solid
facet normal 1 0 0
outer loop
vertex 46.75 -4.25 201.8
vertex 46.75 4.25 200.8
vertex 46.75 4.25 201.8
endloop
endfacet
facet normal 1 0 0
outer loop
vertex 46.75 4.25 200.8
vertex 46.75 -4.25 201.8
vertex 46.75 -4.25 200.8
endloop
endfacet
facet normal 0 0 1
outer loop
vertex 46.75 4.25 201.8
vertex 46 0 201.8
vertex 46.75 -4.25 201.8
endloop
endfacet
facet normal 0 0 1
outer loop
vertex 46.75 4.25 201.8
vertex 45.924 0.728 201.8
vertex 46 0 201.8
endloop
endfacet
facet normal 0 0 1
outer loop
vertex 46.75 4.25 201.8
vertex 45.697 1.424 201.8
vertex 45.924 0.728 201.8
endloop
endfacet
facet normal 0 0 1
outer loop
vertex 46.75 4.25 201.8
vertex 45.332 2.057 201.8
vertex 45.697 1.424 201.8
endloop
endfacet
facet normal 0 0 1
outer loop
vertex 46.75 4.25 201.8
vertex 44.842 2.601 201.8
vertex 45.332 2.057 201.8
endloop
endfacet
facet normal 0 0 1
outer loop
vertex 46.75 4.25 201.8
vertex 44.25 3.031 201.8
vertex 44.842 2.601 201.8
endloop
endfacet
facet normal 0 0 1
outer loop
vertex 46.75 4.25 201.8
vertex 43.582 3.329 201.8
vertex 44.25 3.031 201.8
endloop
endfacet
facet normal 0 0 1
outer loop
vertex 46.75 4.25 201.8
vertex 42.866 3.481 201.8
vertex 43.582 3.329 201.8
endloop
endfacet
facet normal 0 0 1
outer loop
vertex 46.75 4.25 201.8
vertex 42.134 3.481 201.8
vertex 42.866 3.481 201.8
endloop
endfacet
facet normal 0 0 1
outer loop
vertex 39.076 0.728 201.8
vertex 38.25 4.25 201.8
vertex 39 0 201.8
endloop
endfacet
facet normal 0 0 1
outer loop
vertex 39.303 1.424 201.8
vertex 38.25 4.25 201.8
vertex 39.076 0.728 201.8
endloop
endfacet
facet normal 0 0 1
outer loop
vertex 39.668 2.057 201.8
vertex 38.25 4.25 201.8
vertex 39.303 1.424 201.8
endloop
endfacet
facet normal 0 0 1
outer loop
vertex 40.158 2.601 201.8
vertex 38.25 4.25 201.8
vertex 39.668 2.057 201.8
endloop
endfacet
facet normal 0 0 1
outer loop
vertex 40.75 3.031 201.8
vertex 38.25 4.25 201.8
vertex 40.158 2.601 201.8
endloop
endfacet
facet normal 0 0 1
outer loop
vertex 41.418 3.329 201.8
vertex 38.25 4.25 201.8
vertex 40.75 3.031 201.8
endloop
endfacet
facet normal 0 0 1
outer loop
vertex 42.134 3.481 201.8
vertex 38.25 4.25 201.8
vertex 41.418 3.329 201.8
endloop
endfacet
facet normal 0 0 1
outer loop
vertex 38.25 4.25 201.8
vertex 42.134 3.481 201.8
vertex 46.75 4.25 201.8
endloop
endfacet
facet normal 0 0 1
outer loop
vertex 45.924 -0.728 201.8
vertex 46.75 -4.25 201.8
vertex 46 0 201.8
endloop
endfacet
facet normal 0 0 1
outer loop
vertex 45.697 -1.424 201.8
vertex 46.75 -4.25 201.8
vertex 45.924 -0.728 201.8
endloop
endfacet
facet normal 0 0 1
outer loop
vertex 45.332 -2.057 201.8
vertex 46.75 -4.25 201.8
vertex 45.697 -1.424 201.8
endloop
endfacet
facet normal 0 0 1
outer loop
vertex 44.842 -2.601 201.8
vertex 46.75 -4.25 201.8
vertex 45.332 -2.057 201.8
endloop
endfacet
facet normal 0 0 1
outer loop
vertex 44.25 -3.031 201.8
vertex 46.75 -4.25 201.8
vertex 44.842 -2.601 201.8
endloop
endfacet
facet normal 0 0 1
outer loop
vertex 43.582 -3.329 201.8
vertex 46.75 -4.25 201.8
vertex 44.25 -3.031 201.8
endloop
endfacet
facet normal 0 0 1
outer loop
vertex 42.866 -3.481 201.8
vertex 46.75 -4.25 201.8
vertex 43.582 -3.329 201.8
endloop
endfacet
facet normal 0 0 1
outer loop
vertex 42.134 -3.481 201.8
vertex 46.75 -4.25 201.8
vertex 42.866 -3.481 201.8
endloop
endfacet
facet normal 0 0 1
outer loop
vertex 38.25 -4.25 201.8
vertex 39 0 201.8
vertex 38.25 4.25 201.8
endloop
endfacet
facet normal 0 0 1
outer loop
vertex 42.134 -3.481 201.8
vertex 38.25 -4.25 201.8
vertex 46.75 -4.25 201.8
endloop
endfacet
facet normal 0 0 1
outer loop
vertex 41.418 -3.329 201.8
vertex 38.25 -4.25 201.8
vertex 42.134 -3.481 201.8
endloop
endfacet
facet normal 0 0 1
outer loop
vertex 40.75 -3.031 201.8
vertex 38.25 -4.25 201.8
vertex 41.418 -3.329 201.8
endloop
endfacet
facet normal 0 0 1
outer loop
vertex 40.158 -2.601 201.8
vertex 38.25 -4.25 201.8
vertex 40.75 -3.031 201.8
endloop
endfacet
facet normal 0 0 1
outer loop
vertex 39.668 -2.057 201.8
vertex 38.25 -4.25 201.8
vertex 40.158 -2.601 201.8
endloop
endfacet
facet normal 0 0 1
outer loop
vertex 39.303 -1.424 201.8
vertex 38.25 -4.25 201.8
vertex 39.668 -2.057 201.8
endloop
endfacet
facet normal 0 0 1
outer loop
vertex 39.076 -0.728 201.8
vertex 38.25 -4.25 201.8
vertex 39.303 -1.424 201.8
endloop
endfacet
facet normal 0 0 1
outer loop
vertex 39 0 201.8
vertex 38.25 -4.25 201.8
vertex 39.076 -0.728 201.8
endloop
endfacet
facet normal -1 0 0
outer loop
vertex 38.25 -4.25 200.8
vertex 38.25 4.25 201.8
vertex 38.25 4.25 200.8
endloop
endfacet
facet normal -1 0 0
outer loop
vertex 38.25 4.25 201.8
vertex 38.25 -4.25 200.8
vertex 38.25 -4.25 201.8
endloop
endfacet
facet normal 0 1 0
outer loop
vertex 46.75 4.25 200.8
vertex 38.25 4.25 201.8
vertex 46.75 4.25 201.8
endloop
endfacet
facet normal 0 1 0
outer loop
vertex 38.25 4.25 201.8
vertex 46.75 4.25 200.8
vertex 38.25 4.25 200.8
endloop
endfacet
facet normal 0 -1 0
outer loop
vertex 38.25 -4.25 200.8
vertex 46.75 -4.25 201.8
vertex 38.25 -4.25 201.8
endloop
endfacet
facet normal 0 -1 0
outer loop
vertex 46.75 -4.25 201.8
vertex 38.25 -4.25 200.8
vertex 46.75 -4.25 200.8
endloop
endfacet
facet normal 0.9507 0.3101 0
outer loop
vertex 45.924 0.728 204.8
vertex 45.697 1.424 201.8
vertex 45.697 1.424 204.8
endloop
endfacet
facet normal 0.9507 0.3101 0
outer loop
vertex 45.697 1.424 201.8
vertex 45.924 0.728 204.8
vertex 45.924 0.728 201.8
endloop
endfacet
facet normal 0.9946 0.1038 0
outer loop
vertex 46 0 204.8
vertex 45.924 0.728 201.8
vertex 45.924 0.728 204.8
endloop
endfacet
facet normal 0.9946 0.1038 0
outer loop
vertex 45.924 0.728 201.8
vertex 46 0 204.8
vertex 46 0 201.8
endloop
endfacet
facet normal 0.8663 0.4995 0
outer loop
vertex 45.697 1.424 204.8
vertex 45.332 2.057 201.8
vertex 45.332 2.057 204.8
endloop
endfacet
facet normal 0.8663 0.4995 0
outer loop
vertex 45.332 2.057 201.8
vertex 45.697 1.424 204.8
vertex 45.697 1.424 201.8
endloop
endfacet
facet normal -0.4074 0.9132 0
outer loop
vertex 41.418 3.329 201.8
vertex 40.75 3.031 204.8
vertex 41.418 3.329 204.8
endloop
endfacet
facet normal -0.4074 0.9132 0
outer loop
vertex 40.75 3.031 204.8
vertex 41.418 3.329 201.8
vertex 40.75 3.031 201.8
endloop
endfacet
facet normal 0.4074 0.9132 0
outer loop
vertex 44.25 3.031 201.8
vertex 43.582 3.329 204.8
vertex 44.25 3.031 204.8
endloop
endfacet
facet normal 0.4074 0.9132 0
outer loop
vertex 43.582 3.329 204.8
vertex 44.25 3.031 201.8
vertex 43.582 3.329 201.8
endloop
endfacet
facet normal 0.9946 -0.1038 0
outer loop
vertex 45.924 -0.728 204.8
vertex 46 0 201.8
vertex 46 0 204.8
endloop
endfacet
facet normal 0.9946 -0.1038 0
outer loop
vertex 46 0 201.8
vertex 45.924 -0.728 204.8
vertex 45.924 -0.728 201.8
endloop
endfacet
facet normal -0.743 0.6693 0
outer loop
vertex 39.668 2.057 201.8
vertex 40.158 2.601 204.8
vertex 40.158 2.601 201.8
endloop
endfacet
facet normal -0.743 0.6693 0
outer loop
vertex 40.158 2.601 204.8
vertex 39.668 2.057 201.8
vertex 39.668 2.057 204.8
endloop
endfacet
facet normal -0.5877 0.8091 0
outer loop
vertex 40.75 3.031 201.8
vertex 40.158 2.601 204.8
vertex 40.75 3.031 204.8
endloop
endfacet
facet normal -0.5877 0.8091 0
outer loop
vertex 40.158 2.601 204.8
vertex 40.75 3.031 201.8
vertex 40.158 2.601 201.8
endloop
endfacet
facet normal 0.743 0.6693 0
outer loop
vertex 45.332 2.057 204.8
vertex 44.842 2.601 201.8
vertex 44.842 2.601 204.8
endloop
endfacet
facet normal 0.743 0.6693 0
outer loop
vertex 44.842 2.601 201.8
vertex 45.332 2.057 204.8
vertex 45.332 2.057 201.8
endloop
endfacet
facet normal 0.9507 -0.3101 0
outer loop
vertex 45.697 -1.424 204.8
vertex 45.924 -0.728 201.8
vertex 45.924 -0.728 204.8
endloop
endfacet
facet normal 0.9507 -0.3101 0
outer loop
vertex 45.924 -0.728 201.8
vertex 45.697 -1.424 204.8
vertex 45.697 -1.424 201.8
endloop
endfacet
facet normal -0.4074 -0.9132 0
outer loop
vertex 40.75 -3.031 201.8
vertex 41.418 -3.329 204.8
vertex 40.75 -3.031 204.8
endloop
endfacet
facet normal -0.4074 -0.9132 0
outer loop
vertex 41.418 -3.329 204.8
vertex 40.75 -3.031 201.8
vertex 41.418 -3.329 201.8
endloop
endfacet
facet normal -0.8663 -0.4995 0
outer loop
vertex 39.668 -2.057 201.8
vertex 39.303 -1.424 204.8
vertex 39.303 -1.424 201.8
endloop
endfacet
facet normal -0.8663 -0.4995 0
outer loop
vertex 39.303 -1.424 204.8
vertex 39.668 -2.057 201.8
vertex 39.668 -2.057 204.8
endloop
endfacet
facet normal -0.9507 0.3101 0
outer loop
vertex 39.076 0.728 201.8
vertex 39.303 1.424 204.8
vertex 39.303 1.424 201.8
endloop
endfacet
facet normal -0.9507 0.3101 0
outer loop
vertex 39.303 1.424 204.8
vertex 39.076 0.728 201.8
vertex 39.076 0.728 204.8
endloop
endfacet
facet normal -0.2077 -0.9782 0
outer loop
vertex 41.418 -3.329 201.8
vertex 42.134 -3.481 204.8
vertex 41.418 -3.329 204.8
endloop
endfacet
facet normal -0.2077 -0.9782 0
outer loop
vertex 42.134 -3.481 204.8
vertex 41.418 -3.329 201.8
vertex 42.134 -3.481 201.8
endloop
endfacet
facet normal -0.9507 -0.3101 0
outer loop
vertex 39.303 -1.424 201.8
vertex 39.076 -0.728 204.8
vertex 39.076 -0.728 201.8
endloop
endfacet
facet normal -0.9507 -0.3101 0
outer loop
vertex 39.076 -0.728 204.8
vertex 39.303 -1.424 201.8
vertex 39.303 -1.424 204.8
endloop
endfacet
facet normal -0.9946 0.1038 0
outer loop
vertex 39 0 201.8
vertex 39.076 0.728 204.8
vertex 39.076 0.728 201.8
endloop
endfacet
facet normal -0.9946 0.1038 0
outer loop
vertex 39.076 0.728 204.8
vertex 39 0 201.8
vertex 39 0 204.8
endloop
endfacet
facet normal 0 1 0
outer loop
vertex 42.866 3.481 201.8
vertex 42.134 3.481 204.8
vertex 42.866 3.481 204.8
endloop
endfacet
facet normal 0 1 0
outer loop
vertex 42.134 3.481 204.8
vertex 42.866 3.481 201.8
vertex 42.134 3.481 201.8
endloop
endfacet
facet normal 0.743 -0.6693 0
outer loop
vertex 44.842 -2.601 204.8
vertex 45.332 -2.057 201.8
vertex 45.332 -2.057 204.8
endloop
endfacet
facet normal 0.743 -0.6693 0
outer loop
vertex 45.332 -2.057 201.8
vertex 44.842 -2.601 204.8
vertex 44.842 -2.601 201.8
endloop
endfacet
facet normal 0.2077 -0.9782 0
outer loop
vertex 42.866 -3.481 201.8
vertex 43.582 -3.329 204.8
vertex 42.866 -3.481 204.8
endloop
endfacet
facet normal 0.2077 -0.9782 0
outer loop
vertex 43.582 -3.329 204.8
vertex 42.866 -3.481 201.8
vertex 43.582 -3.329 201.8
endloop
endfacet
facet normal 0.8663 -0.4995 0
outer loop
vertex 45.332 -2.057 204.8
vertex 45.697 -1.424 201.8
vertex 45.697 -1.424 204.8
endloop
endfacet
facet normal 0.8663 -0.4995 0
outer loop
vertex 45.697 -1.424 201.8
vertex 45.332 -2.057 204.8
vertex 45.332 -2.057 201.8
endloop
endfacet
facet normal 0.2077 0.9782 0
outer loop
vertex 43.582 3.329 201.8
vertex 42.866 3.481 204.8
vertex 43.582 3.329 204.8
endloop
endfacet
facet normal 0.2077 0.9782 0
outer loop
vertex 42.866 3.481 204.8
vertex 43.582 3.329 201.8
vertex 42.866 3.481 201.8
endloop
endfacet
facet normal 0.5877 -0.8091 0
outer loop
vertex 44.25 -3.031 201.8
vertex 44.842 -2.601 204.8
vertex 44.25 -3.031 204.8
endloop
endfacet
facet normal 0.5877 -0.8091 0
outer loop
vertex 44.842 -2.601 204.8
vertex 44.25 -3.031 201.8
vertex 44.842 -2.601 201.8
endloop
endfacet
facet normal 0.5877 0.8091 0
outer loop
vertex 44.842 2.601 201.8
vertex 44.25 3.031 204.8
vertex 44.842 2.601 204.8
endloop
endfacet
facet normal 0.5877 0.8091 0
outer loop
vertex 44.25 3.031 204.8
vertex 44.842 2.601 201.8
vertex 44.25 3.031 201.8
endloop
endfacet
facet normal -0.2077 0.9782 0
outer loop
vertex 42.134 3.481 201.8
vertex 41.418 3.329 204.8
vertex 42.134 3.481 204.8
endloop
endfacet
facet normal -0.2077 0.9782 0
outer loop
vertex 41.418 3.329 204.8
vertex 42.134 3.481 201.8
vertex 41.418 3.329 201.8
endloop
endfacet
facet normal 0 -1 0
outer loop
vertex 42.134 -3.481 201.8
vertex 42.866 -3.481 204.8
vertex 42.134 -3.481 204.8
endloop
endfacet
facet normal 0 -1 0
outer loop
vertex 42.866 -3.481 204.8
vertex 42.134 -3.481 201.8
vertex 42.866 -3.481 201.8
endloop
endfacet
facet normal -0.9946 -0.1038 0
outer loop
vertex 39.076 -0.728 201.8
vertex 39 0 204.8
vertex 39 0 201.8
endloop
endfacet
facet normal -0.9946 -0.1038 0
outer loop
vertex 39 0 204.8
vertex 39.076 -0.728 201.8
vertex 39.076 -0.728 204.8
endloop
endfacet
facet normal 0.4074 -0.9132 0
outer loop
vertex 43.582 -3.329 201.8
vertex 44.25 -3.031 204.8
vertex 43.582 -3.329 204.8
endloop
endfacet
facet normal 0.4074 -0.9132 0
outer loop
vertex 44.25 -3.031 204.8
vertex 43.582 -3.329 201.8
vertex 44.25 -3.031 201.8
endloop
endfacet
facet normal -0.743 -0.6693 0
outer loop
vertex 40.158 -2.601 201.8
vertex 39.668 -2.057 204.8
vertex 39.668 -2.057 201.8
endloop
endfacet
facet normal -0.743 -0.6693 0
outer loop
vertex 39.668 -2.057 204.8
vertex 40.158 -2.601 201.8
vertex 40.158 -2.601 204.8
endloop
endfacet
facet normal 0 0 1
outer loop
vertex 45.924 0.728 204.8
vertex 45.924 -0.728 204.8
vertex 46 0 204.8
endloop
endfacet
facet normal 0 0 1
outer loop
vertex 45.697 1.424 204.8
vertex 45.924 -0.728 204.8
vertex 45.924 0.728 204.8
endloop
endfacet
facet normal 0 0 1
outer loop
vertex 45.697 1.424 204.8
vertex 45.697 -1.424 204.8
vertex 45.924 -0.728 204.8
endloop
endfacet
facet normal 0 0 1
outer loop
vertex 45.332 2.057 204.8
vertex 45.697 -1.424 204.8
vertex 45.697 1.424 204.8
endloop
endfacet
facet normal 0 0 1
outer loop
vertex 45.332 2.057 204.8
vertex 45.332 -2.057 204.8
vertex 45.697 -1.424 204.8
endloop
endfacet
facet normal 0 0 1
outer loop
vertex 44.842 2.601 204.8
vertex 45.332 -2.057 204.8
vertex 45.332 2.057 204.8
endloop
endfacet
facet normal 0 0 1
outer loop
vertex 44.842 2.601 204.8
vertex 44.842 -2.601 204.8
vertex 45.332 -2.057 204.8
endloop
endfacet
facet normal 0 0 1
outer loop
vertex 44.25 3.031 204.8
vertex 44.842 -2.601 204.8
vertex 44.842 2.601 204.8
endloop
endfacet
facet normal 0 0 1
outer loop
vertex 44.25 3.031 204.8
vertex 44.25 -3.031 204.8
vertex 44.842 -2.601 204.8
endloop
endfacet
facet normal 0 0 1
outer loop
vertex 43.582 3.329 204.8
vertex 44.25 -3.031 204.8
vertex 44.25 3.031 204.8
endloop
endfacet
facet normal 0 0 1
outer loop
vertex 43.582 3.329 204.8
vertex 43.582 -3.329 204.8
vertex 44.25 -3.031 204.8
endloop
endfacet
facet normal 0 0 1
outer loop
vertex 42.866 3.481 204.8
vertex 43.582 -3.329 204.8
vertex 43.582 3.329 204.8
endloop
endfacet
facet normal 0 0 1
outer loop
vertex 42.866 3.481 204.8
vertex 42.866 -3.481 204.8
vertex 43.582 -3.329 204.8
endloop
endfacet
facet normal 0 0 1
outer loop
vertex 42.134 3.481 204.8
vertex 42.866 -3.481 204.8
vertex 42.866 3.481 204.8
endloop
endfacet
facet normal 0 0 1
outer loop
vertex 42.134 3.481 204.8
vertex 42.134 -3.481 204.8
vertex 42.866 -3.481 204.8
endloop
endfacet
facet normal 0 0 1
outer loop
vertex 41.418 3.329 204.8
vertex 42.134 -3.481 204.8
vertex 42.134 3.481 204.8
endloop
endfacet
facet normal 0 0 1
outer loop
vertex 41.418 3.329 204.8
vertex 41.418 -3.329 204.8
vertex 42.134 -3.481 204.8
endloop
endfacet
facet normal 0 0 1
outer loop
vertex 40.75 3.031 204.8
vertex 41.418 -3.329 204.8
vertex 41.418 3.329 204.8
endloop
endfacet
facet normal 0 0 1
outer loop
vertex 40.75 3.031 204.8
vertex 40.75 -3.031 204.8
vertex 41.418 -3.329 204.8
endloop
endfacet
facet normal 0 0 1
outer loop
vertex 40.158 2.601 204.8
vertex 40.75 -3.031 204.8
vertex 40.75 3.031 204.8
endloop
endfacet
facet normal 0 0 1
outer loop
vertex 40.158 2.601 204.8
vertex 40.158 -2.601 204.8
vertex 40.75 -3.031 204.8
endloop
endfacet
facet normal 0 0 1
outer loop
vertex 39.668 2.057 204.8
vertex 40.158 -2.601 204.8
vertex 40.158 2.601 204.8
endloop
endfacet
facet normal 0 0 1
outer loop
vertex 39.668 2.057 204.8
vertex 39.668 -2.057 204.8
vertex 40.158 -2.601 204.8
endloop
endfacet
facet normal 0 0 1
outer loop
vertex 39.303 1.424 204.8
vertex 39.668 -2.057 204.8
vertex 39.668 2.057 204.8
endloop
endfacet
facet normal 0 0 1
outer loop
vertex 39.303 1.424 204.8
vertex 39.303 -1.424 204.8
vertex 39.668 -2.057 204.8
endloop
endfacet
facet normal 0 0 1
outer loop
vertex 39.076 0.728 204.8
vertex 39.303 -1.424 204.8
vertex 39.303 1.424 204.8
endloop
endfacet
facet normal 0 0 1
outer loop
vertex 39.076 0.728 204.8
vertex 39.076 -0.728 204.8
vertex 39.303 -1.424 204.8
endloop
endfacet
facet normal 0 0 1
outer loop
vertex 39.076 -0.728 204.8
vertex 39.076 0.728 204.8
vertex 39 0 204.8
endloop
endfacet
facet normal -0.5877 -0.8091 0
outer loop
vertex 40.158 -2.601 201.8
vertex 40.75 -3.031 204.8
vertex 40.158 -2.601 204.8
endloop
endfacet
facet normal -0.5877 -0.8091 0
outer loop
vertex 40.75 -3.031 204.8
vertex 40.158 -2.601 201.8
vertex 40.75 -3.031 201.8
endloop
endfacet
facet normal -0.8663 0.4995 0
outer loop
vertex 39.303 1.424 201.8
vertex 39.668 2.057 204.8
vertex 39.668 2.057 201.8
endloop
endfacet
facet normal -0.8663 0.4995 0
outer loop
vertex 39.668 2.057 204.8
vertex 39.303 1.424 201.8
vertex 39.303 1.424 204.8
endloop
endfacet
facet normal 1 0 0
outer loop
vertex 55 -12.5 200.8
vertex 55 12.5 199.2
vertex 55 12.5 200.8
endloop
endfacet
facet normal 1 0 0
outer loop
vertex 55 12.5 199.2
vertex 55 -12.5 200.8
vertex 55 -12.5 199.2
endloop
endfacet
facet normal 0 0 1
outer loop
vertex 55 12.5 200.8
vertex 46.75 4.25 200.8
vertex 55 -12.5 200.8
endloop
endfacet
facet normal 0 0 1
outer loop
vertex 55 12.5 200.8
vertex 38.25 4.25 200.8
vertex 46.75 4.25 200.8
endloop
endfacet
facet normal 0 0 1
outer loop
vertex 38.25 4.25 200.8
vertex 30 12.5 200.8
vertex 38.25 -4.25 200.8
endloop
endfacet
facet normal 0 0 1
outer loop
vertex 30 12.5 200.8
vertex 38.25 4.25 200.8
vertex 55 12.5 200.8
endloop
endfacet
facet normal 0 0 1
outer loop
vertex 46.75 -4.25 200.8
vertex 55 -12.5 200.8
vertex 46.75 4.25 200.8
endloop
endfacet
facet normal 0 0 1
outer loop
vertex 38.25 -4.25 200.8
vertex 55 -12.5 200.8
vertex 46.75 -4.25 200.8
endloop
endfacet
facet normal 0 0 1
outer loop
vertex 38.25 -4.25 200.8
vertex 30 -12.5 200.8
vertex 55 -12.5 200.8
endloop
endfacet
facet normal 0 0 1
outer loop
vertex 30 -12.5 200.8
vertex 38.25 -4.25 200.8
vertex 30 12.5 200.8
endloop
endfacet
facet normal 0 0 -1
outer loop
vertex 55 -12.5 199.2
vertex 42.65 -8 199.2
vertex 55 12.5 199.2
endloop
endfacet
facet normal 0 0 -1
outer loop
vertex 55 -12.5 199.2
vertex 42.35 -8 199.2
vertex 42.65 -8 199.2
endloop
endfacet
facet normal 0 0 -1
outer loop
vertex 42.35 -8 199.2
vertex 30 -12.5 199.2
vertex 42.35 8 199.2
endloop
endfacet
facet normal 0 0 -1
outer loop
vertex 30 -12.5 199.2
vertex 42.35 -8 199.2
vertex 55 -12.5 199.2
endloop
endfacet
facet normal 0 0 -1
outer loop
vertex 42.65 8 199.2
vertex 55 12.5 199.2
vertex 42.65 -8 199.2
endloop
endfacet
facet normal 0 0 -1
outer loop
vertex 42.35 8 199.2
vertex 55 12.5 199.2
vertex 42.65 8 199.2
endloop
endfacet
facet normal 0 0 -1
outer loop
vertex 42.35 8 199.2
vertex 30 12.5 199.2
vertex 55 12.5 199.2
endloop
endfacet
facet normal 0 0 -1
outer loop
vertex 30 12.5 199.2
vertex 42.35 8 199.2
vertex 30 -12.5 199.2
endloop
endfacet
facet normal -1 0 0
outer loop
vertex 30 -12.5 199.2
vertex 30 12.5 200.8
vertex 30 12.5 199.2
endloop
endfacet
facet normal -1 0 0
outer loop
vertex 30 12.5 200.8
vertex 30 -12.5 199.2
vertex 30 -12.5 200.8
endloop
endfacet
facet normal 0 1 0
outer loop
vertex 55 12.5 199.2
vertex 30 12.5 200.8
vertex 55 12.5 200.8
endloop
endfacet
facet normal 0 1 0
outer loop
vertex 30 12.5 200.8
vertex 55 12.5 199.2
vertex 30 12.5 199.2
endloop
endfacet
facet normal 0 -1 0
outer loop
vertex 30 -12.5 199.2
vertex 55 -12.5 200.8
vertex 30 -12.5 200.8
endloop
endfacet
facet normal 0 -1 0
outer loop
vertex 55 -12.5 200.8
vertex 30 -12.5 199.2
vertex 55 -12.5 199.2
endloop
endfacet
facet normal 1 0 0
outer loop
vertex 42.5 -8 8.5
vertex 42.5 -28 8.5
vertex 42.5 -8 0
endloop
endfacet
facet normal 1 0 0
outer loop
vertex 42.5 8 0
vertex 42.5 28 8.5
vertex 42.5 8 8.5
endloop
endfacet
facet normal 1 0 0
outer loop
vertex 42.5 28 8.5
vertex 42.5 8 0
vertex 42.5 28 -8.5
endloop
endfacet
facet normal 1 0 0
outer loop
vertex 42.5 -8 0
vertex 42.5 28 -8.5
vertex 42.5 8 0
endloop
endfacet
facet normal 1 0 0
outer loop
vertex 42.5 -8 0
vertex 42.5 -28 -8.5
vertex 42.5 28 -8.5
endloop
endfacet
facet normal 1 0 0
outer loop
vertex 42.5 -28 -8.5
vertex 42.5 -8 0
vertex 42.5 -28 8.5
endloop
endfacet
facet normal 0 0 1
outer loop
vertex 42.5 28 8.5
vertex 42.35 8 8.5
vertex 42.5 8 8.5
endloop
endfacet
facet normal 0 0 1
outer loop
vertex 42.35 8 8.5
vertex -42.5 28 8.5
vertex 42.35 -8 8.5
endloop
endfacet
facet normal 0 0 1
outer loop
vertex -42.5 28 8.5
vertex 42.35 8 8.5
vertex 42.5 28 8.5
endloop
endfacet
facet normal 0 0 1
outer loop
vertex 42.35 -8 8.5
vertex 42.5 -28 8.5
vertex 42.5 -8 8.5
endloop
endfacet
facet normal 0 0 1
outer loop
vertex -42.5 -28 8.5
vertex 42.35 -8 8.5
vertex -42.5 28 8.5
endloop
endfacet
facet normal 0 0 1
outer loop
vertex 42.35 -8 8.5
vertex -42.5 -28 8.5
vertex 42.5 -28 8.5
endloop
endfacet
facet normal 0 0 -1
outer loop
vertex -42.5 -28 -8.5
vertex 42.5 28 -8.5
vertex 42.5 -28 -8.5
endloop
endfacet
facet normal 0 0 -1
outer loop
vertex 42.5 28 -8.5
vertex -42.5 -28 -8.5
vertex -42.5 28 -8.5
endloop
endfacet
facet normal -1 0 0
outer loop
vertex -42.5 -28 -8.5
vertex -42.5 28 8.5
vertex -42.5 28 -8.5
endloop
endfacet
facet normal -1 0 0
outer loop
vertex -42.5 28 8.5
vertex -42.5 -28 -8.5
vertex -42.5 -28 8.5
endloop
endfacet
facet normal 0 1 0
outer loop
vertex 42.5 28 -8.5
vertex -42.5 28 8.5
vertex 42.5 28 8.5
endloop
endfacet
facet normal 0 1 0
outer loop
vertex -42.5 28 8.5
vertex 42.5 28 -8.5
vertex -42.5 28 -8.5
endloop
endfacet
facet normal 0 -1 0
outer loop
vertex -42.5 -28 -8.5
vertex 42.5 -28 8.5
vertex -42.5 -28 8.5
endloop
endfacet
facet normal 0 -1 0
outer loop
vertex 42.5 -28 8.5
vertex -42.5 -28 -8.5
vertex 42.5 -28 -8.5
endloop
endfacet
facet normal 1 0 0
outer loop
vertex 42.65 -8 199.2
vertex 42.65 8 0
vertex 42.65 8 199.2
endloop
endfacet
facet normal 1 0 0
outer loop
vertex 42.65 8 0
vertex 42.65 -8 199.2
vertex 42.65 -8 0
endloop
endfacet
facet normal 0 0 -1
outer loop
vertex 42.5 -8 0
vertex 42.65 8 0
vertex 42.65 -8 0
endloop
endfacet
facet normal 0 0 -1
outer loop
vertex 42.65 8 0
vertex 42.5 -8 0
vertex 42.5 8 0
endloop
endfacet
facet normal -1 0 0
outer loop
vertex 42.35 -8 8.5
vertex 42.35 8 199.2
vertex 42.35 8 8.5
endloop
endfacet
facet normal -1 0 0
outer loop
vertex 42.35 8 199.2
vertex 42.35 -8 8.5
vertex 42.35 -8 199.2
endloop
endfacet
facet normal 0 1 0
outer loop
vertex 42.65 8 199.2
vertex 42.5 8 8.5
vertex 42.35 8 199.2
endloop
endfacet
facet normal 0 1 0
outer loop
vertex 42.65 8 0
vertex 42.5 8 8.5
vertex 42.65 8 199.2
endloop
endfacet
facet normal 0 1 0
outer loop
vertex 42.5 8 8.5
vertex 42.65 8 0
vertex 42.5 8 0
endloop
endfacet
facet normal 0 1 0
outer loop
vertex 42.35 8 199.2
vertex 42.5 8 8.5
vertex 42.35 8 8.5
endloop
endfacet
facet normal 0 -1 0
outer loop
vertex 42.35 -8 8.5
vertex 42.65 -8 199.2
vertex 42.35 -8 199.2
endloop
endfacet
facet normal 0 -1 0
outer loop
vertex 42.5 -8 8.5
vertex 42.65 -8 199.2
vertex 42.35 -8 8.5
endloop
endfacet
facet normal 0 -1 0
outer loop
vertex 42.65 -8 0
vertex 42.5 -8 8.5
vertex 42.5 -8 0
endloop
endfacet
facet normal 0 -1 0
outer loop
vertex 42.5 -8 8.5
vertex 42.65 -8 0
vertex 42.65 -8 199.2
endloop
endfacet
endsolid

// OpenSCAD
// ============================================================================
// PROJECT AEVUM: PI 5 BLOCK WITH 90-DEGREE UPWARD VERTICAL CABLE & CAMERA
// ============================================================================

$fn = 30;

// --- Precise Dimensions from User Specs ---
pi_l = 85;    // Length (mm)
pi_w = 56;    // Width (mm)
pi_h = 17;    // Height (mm)

cable_l = 200; // Cable Length (mm)
cable_w = 16;  // Cable Width (mm)
cable_t = 0.3; // Cable Thickness (mm)

cam_w = 25;    // Camera PCB Width (mm)
cam_l = 25;    // Camera PCB Length (mm)
sensor_w = 8.5; // Sensor Block Width (mm)
sensor_l = 8.5; // Sensor Block Length (mm)
sensor_h = 5;   // Lens Height (mm)

// --- Color Scheme ---
color_block   = [0.15, 0.15, 0.18]; // Sleek Dark Block
color_cable   = [0.85, 0.85, 0.80]; // Cream/White Ribbon
color_silicon = [0.12, 0.48, 0.22]; // Pi Green for Camera PCB
color_lens    = [0.05, 0.05, 0.08]; // Camera Optical Lens

// ============================================================================
// ASSEMBLY GENERATION
// ============================================================================

// 1. Raspberry Pi 5 Main Block (Centered on Origin)
color(color_block) cube([pi_l, pi_w, pi_h], center=true);

// 2. Vertical 90-Degree CSI Ribbon Cable
// Positioned right at the front edge of the length axis (X = pi_l/2)
translate([pi_l/2, 0, 0]) {
    // Shifting upwards so the bottom of the cable aligns with the center of the Pi face
    translate([0, 0, cable_l/2]) {
        color(color_cable) cube([cable_t, cable_w, cable_l], center=true);
    }
}

// 3. OV5647 Camera Module Assembly (Facing Upward at the Cable Tip)
// Placed at the very top of the 200mm vertical run (Z = cable_l)
translate([pi_l/2, 0, cable_l]) {
    rotate([0, 0, 0]) { // Sitting completely flat on the horizontal XY plane
        
        // Camera Carrier Board
        color(color_silicon) cube([cam_l, cam_w, 1.6], center=true);
        
        // Lens Housing and Optic Core pointing straight up along Z-axis
        translate([0, 0, 1.6/2]) {
            color([0.2, 0.2, 0.2]) cube([sensor_l, sensor_w, 2], center=true);
            color(color_lens) translate([0, 0, 1]) cylinder(h=sensor_h-2, d=7);
        }
    }
}
